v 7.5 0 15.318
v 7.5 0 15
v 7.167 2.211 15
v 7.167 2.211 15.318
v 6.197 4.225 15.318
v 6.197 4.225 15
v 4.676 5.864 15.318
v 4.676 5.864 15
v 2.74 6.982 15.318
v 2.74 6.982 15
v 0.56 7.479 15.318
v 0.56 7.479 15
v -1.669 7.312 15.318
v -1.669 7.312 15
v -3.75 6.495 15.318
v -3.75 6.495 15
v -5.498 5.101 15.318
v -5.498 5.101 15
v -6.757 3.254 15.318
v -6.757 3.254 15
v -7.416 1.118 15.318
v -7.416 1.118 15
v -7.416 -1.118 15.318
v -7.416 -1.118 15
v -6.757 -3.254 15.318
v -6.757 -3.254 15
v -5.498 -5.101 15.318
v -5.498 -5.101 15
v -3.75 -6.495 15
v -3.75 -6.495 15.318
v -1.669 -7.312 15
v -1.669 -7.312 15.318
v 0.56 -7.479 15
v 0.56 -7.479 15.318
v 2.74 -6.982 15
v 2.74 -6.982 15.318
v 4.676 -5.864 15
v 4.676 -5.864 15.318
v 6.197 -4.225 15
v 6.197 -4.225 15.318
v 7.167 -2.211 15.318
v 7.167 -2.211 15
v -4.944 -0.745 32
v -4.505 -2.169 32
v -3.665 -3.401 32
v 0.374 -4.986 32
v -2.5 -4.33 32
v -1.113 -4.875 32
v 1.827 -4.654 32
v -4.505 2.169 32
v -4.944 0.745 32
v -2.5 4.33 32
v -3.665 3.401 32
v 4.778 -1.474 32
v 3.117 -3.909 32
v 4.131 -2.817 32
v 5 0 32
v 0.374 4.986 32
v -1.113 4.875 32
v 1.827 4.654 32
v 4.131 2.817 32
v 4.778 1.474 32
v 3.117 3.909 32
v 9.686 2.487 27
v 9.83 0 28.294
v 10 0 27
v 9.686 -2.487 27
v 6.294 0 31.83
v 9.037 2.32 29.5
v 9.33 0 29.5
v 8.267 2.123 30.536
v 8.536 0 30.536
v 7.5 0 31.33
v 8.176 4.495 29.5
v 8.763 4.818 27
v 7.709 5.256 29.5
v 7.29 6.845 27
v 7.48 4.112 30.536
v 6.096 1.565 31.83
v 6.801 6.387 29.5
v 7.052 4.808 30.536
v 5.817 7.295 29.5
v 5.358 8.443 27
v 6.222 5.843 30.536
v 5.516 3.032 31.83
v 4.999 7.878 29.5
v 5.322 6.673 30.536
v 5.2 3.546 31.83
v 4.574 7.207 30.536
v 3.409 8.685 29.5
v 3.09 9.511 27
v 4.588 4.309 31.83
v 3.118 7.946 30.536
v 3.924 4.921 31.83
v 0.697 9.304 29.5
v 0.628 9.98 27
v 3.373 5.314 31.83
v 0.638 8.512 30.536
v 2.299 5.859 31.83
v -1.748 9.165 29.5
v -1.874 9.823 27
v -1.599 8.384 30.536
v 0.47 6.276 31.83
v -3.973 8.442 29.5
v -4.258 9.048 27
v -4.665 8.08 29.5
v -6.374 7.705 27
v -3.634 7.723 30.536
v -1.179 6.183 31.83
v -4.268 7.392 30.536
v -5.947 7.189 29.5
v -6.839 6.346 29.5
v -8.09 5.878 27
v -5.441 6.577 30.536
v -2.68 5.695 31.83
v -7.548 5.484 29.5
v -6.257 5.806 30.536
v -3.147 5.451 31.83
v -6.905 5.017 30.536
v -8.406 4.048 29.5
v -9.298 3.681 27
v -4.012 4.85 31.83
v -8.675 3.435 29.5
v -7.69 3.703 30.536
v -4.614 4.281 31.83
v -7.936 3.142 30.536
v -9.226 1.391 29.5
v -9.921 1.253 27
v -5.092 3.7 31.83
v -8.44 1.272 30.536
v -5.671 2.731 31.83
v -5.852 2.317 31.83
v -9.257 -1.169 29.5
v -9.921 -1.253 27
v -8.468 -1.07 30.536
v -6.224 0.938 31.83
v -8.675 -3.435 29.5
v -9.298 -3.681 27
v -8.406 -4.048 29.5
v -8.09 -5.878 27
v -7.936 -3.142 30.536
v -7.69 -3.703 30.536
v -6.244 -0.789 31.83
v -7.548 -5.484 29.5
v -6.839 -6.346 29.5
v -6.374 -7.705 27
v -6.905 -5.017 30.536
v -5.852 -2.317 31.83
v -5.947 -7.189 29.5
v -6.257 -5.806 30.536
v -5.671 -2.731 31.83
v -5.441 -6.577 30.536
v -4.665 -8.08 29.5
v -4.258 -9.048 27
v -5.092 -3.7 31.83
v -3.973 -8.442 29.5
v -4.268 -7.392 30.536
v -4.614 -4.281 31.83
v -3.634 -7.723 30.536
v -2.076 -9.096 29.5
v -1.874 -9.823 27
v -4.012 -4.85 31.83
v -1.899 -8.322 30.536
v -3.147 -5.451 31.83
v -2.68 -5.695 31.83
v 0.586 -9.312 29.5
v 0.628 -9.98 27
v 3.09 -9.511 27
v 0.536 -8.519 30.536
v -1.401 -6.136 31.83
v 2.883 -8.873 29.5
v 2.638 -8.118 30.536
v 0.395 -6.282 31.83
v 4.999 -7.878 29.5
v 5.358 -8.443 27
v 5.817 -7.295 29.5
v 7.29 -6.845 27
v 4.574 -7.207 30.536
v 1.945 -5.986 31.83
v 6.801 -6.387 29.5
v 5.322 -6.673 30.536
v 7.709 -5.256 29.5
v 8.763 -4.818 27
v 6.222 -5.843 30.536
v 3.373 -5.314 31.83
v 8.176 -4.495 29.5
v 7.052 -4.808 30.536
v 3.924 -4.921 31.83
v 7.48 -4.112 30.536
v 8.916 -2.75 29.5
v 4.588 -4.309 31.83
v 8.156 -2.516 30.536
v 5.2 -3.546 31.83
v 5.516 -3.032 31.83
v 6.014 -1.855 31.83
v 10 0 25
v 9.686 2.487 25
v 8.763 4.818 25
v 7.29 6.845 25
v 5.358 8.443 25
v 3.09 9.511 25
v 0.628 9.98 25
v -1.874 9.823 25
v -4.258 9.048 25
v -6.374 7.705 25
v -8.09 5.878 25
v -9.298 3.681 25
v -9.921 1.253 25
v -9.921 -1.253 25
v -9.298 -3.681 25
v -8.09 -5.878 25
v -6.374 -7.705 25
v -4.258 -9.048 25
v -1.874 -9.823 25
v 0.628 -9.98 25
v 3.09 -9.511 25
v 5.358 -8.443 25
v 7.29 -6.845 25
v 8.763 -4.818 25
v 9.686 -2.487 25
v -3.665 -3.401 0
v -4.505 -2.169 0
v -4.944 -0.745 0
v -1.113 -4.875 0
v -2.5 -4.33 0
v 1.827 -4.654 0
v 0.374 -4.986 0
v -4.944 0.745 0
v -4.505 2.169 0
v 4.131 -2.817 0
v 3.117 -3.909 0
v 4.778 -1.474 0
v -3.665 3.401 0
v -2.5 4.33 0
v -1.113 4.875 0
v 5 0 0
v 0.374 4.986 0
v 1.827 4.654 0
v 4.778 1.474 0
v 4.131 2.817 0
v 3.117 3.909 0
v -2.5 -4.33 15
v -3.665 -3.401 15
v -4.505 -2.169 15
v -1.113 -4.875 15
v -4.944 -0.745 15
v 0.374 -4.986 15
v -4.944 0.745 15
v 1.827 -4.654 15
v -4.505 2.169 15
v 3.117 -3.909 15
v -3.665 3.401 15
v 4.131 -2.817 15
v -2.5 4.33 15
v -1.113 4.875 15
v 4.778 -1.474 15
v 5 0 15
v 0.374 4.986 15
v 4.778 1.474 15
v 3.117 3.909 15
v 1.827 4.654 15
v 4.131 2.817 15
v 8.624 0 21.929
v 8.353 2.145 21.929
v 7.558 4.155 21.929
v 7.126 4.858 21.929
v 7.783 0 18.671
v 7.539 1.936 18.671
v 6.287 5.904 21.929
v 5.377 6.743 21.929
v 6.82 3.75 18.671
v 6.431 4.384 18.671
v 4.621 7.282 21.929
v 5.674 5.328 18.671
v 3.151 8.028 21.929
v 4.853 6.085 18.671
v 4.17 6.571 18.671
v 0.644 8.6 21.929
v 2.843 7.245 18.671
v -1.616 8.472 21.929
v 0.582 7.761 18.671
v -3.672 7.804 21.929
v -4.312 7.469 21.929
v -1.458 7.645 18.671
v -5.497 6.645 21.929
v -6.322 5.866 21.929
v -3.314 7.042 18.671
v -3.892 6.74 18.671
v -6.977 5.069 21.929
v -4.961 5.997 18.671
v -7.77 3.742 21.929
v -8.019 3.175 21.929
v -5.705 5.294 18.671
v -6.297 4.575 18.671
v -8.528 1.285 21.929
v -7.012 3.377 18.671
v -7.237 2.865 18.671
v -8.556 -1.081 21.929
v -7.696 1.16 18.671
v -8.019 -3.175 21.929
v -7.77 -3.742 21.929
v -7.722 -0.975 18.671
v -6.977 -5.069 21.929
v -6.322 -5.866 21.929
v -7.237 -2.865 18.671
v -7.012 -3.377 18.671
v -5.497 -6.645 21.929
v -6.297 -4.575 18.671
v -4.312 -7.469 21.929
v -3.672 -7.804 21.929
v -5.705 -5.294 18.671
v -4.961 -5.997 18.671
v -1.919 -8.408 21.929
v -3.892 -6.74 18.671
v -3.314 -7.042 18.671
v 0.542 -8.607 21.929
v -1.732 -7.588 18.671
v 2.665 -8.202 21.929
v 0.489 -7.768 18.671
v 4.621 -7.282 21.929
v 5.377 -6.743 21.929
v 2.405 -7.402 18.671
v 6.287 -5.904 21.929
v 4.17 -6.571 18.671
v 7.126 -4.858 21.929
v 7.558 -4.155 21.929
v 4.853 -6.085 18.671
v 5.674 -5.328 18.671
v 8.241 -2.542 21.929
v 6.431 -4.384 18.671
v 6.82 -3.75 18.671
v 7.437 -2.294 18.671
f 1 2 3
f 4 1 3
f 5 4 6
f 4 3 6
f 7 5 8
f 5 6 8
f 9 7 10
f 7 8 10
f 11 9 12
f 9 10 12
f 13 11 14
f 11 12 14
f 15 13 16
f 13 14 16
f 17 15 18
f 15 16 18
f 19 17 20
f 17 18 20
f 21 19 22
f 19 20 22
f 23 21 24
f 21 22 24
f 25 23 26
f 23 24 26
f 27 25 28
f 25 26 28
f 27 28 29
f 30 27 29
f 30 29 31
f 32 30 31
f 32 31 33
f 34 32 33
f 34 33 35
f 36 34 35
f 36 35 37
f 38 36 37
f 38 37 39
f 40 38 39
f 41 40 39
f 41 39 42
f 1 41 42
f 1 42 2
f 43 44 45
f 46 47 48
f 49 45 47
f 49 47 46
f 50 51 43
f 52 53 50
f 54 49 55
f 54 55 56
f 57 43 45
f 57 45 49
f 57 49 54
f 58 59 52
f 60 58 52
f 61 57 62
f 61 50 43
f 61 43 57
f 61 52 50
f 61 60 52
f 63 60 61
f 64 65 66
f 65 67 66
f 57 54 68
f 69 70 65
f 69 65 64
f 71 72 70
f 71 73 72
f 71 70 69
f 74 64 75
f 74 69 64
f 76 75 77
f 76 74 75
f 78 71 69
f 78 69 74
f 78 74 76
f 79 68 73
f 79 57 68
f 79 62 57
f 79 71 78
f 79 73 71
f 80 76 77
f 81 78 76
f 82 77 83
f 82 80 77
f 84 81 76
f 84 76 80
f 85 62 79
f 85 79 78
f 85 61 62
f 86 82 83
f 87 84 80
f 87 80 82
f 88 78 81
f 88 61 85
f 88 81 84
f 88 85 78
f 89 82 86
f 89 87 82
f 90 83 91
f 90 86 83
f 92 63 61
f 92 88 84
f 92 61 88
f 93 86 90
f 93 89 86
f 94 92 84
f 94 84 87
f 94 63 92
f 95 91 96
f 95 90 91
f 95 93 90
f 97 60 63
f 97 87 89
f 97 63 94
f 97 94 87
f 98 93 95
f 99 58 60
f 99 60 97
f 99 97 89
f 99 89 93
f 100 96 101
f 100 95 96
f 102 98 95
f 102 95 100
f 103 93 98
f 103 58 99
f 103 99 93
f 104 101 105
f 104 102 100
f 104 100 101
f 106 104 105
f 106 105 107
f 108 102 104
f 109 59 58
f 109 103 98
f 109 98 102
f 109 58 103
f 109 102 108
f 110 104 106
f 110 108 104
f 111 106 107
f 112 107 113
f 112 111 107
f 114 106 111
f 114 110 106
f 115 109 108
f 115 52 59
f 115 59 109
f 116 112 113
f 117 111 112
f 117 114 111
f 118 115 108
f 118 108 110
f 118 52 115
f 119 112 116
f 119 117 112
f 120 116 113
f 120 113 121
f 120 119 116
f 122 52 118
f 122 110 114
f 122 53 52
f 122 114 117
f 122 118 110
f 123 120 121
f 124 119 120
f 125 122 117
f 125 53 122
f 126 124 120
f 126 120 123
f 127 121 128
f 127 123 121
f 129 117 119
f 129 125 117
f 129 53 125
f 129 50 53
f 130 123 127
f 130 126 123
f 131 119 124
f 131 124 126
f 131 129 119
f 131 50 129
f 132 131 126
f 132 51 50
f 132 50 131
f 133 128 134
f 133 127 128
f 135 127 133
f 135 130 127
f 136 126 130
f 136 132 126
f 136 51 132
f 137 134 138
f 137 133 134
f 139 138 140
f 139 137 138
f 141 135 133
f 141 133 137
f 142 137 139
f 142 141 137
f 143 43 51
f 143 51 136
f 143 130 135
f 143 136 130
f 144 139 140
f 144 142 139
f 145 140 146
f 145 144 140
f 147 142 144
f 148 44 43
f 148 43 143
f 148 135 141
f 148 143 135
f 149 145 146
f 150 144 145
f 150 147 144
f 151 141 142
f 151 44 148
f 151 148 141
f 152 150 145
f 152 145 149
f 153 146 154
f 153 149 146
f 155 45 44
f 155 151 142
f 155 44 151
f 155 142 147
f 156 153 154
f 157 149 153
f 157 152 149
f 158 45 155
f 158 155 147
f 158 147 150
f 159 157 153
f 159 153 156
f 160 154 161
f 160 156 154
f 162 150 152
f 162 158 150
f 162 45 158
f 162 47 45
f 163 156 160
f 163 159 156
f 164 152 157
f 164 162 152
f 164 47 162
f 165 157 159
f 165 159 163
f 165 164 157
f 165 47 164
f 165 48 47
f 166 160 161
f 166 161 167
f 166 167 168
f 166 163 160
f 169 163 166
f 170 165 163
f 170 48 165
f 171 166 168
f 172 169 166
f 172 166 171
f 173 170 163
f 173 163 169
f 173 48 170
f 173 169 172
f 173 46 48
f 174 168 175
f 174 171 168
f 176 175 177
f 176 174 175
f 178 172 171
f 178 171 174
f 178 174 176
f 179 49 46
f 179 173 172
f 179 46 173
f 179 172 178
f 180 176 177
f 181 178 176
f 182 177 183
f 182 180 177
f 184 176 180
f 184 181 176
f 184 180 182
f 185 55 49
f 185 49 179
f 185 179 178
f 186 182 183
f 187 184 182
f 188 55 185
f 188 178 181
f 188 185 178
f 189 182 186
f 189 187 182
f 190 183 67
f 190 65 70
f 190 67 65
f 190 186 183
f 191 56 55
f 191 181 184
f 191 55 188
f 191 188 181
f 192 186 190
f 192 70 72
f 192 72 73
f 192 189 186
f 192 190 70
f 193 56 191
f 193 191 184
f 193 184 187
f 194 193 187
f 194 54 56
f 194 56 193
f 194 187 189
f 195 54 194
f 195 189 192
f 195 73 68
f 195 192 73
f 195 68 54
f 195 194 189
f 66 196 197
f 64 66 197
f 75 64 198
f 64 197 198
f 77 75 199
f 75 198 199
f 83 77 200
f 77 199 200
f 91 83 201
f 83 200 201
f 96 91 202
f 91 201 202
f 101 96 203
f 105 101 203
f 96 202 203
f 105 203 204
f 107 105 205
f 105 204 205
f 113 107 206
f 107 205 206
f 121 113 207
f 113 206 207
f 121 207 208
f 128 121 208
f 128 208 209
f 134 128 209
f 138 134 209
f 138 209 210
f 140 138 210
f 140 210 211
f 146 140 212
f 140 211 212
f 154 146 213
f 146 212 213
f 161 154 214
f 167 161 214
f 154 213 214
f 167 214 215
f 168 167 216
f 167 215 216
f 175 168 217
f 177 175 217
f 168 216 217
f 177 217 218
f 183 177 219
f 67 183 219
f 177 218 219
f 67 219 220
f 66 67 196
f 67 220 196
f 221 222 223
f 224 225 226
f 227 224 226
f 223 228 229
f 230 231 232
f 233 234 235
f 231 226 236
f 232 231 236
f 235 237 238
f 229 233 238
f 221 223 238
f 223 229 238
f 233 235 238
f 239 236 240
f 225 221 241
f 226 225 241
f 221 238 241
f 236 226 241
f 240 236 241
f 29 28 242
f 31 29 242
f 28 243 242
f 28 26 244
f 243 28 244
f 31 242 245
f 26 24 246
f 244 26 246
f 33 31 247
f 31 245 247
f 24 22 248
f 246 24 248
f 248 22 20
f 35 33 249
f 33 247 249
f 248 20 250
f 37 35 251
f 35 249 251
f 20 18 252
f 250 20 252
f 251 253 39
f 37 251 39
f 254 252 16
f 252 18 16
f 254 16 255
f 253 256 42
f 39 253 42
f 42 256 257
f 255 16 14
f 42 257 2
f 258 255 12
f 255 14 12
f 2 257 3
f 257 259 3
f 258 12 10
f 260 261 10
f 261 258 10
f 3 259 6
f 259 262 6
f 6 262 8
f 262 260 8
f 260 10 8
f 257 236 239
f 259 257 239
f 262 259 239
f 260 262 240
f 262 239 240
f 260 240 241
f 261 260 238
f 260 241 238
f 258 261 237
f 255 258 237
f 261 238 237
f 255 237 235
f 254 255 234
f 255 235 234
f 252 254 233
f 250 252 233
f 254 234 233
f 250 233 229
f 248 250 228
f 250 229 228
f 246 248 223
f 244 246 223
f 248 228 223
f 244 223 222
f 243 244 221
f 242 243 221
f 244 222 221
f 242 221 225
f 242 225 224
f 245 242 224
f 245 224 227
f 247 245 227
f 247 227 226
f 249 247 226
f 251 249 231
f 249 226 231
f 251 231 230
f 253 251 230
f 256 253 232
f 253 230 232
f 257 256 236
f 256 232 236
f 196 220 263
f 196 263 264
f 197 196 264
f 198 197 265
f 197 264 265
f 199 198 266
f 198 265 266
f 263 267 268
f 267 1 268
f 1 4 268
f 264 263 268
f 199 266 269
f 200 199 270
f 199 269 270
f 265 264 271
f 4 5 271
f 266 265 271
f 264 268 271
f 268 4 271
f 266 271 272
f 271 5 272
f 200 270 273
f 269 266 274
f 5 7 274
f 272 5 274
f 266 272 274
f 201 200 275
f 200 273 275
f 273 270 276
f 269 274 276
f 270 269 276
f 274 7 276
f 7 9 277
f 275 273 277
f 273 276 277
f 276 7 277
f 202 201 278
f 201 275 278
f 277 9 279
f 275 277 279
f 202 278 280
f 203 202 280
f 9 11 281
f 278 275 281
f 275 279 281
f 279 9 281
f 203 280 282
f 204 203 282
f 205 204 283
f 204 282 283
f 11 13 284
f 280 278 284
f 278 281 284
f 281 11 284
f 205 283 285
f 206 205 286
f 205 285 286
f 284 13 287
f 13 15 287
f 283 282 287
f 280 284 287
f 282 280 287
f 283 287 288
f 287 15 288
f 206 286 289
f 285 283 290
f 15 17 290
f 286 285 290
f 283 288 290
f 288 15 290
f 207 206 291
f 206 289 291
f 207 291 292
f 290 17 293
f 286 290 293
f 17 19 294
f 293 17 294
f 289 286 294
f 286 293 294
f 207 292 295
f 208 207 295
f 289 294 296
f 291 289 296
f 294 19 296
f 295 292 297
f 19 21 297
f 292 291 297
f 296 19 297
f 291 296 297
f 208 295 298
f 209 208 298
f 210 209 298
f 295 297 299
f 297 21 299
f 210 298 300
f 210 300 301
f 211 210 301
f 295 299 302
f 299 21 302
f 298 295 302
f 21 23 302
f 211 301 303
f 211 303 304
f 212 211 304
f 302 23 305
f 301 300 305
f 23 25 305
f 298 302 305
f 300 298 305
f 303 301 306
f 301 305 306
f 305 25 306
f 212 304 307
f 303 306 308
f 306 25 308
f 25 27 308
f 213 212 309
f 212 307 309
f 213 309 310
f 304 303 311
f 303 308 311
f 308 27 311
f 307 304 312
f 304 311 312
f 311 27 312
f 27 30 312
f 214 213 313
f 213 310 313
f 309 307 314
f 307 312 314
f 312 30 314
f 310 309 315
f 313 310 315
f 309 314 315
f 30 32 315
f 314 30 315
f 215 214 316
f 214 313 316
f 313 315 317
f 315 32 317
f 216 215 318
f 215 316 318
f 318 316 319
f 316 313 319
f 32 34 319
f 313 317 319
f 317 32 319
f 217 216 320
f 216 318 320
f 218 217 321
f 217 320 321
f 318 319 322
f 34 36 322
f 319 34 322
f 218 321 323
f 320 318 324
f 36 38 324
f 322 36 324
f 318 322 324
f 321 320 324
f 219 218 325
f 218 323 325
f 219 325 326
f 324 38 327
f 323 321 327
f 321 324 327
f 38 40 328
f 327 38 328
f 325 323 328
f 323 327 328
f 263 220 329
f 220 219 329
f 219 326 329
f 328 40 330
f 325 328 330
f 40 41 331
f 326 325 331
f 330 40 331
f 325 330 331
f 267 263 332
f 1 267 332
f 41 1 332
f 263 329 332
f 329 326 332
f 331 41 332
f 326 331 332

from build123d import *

# Parameters (mm, degrees)
SKETCH1_R           = 5
BOSS_EXTRUDE1_DEPTH = 15
SKETCH2_R           = 7.5
BOSS_EXTRUDE2_DEPTH = 10
SKETCH3_R           = 10
BOSS_EXTRUDE3_DEPTH = 7
FILLET1_R           = 20
FILLET2_R           = 5


with BuildPart() as part:
    # Sketch1 → Boss-Extrude1 (new body)
    with BuildSketch(Plane.XY):
        Circle(SKETCH1_R)
    extrude(amount=BOSS_EXTRUDE1_DEPTH)

    # Sketch2 → Boss-Extrude2 (add)
    with BuildSketch(Plane.XY.offset(15)):
        Circle(SKETCH2_R)
    extrude(amount=BOSS_EXTRUDE2_DEPTH)

    # Sketch3 → Boss-Extrude3 (add)
    with BuildSketch(Plane.XY.offset(25)):
        Circle(SKETCH3_R)
    extrude(amount=BOSS_EXTRUDE3_DEPTH)

    # Fillet1
    # the kernel refuses this fillet: 20 mm, written as the material it adds along each edge
    with BuildSketch(Plane(origin=(0, 0, 25), x_dir=(1, 0, 0), z_dir=(0, -1, 0))) as fillet1_piece_1:
        with BuildLine():
            CenterArc((27.5, -9.682458366), FILLET1_R, 151.044975628, 28.955024372)
            Line((7.5, -9.682458366), (7.1, -9.682458366))
            Line((7.1, -9.682458366), (7.1, 0))
            Line((7.1, 0), (7.5, 0.4))
            ThreePointArc((7.5, 0.4), (8.75, 0.4), (9.65, 0.193649167))
            Line((9.65, 0.193649167), (10, 0))
        make_face()
    revolve(axis=Axis((0, 0, 25), (0, 0, 1)))

    # Fillet2
    fillet2_edges = [part.edges().sort_by_distance(p)[0] for p in [
        (-10, 0, 32),
    ]]
    fillet(fillet2_edges, radius=FILLET2_R)


solid = part.part
